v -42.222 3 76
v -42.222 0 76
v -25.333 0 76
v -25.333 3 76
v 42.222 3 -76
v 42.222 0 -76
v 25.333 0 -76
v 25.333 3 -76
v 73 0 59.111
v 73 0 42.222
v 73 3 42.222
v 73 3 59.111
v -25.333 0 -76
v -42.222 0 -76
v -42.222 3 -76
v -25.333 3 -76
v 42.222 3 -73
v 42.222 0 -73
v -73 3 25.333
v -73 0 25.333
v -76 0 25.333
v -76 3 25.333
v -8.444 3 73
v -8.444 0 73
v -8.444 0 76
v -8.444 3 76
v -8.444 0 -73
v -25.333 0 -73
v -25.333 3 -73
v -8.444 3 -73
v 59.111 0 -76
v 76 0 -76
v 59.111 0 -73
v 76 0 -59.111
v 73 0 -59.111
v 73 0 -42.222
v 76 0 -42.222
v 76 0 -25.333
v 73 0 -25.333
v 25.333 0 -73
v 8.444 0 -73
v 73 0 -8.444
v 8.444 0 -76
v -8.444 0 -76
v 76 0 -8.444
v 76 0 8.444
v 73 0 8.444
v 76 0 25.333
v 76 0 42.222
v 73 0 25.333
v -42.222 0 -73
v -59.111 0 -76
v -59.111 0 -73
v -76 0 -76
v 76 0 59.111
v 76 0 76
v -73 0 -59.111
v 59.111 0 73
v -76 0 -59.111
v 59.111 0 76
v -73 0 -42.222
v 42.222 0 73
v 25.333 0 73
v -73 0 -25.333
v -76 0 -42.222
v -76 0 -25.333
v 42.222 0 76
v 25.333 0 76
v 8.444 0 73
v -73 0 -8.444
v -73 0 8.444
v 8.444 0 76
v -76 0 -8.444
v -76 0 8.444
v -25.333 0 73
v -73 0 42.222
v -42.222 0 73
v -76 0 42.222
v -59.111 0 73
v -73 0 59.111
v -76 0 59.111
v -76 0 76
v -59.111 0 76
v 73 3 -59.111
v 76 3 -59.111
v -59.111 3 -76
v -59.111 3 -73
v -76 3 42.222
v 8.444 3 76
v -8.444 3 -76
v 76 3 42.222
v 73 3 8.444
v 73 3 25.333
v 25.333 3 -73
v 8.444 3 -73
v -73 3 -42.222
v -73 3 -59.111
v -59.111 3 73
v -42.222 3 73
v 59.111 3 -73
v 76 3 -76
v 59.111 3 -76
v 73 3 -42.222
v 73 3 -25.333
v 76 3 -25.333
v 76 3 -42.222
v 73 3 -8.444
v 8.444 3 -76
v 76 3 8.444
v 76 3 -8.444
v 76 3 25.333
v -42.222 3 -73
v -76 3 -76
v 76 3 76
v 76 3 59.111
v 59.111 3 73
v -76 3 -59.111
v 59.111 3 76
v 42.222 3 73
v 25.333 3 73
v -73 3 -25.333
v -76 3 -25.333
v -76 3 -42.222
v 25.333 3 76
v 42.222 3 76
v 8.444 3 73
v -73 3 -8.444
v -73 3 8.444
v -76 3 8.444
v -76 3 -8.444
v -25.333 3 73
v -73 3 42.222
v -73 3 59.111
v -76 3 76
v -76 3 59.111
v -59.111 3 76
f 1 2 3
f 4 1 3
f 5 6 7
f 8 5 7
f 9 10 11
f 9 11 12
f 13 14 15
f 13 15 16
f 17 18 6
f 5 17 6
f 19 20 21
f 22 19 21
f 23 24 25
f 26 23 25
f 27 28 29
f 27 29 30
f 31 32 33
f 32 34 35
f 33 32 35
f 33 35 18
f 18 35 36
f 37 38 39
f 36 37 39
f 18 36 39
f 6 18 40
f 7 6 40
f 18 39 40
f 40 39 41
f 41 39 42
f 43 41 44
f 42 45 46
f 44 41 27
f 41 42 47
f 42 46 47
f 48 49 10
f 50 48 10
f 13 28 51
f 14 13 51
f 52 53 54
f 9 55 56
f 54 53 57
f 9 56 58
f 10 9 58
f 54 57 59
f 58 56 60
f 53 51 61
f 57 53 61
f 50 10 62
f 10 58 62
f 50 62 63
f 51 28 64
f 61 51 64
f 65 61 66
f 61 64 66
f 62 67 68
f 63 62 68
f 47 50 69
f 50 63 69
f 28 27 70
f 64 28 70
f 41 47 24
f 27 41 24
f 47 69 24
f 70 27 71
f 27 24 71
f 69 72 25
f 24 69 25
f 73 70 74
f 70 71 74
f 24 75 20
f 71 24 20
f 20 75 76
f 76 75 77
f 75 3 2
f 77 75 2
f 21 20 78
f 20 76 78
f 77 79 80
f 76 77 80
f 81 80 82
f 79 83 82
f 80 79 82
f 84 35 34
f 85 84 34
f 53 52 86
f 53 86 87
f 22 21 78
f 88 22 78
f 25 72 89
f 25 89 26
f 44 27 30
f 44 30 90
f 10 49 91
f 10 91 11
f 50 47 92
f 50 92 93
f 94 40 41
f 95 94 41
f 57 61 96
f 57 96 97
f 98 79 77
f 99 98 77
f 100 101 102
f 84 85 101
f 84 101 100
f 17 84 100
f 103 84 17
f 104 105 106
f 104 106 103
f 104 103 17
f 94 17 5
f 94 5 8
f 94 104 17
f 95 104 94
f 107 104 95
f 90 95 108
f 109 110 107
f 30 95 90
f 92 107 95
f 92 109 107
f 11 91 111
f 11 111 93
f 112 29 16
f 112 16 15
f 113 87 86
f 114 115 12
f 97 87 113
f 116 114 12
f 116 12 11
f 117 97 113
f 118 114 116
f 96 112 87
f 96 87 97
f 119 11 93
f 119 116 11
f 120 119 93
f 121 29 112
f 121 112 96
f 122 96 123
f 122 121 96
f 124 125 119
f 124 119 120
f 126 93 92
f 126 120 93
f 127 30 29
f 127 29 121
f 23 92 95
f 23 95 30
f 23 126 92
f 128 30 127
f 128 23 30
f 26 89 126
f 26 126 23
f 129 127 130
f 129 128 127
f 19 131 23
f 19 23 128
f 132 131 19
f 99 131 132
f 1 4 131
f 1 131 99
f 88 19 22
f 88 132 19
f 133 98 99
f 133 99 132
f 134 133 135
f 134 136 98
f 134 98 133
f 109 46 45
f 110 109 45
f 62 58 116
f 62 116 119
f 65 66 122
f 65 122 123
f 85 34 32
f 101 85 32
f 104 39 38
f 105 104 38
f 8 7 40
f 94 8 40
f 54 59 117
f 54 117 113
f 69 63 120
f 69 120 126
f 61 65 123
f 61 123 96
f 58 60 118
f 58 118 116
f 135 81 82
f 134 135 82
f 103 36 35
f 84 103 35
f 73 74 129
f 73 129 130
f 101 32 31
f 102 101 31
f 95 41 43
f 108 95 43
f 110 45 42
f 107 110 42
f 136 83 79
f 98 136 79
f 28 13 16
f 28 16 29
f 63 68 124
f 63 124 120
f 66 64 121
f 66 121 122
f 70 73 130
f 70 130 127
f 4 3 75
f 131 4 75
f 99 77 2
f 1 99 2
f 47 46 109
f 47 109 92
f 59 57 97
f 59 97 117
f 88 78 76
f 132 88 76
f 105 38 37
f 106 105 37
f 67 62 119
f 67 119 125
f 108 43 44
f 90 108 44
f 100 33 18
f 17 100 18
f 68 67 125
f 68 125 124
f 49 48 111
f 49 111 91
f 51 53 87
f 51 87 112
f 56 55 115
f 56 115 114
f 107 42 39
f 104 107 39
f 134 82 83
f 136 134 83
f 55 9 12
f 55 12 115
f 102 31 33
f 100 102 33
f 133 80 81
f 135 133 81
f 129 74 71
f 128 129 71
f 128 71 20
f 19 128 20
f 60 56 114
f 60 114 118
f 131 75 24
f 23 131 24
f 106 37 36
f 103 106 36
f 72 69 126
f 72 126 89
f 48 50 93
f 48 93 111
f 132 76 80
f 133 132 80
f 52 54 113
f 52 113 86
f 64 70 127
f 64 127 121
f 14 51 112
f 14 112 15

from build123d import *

# Parameters (mm, degrees)
BOSS_EXTRUDE1_DEPTH                      = 3
MIRROR1_AT_THE_SECOND_PLANE_COPY_1_DEPTH = 3


with BuildPart() as part:
    # Sketch1 → Boss-Extrude1 (new body)
    with BuildSketch(Plane(origin=(0, 0, 0), x_dir=(1, 0, 0), z_dir=(0, 1, 0))):
        Polygon((-76, -76), (-59.111111111, -76), (-59.111111111, -73), (-42.222222222, -73), (-42.222222222, -76), (-25.333333333, -76), (-25.333333333, -73), (-8.444444444, -73), (-8.444444444, -76), (0, -76), (0, 0), (-76, 0), (-76, -8.444444444), (-73, -8.444444444), (-73, -25.333333333), (-76, -25.333333333), (-76, -42.222222222), (-73, -42.222222222), (-73, -59.111111111), (-76, -59.111111111), align=None)
    boss_extrude1 = extrude(amount=BOSS_EXTRUDE1_DEPTH)



with BuildPart() as mirror1_1:
    # Mirror1: Boss-Extrude1 across plane
    add(boss_extrude1.mirror(Plane.XY))


with BuildPart() as part_1:
    add(part.part)

    add(mirror1_1.part)  # Mirror1 at the second plane merges Mirror1_1
    # Mirror1 at the second plane: Boss-Extrude1 across plane
    add(boss_extrude1.mirror(Plane(origin=(0, 0, 0), x_dir=(0, 0, 1), z_dir=(1, 0, 0))))

    # Mirror1 at the second plane copy 1 sketc → Mirror1 at the second plane copy 1 (add)
    with BuildSketch(Plane(origin=(0, 0, 0), x_dir=(-1, 0, 0), z_dir=(0, 1, 0))):
        Polygon((-76, -76), (-59.111111111, -76), (-59.111111111, -73), (-42.222222222, -73), (-42.222222222, -76), (-25.333333333, -76), (-25.333333333, -73), (-8.444444444, -73), (-8.444444444, -76), (0, -76), (0, 0), (-76, 0), (-76, -8.444444444), (-73, -8.444444444), (-73, -25.333333333), (-76, -25.333333333), (-76, -42.222222222), (-73, -42.222222222), (-73, -59.111111111), (-76, -59.111111111), align=None)
    extrude(amount=MIRROR1_AT_THE_SECOND_PLANE_COPY_1_DEPTH)


solid = part_1.part
